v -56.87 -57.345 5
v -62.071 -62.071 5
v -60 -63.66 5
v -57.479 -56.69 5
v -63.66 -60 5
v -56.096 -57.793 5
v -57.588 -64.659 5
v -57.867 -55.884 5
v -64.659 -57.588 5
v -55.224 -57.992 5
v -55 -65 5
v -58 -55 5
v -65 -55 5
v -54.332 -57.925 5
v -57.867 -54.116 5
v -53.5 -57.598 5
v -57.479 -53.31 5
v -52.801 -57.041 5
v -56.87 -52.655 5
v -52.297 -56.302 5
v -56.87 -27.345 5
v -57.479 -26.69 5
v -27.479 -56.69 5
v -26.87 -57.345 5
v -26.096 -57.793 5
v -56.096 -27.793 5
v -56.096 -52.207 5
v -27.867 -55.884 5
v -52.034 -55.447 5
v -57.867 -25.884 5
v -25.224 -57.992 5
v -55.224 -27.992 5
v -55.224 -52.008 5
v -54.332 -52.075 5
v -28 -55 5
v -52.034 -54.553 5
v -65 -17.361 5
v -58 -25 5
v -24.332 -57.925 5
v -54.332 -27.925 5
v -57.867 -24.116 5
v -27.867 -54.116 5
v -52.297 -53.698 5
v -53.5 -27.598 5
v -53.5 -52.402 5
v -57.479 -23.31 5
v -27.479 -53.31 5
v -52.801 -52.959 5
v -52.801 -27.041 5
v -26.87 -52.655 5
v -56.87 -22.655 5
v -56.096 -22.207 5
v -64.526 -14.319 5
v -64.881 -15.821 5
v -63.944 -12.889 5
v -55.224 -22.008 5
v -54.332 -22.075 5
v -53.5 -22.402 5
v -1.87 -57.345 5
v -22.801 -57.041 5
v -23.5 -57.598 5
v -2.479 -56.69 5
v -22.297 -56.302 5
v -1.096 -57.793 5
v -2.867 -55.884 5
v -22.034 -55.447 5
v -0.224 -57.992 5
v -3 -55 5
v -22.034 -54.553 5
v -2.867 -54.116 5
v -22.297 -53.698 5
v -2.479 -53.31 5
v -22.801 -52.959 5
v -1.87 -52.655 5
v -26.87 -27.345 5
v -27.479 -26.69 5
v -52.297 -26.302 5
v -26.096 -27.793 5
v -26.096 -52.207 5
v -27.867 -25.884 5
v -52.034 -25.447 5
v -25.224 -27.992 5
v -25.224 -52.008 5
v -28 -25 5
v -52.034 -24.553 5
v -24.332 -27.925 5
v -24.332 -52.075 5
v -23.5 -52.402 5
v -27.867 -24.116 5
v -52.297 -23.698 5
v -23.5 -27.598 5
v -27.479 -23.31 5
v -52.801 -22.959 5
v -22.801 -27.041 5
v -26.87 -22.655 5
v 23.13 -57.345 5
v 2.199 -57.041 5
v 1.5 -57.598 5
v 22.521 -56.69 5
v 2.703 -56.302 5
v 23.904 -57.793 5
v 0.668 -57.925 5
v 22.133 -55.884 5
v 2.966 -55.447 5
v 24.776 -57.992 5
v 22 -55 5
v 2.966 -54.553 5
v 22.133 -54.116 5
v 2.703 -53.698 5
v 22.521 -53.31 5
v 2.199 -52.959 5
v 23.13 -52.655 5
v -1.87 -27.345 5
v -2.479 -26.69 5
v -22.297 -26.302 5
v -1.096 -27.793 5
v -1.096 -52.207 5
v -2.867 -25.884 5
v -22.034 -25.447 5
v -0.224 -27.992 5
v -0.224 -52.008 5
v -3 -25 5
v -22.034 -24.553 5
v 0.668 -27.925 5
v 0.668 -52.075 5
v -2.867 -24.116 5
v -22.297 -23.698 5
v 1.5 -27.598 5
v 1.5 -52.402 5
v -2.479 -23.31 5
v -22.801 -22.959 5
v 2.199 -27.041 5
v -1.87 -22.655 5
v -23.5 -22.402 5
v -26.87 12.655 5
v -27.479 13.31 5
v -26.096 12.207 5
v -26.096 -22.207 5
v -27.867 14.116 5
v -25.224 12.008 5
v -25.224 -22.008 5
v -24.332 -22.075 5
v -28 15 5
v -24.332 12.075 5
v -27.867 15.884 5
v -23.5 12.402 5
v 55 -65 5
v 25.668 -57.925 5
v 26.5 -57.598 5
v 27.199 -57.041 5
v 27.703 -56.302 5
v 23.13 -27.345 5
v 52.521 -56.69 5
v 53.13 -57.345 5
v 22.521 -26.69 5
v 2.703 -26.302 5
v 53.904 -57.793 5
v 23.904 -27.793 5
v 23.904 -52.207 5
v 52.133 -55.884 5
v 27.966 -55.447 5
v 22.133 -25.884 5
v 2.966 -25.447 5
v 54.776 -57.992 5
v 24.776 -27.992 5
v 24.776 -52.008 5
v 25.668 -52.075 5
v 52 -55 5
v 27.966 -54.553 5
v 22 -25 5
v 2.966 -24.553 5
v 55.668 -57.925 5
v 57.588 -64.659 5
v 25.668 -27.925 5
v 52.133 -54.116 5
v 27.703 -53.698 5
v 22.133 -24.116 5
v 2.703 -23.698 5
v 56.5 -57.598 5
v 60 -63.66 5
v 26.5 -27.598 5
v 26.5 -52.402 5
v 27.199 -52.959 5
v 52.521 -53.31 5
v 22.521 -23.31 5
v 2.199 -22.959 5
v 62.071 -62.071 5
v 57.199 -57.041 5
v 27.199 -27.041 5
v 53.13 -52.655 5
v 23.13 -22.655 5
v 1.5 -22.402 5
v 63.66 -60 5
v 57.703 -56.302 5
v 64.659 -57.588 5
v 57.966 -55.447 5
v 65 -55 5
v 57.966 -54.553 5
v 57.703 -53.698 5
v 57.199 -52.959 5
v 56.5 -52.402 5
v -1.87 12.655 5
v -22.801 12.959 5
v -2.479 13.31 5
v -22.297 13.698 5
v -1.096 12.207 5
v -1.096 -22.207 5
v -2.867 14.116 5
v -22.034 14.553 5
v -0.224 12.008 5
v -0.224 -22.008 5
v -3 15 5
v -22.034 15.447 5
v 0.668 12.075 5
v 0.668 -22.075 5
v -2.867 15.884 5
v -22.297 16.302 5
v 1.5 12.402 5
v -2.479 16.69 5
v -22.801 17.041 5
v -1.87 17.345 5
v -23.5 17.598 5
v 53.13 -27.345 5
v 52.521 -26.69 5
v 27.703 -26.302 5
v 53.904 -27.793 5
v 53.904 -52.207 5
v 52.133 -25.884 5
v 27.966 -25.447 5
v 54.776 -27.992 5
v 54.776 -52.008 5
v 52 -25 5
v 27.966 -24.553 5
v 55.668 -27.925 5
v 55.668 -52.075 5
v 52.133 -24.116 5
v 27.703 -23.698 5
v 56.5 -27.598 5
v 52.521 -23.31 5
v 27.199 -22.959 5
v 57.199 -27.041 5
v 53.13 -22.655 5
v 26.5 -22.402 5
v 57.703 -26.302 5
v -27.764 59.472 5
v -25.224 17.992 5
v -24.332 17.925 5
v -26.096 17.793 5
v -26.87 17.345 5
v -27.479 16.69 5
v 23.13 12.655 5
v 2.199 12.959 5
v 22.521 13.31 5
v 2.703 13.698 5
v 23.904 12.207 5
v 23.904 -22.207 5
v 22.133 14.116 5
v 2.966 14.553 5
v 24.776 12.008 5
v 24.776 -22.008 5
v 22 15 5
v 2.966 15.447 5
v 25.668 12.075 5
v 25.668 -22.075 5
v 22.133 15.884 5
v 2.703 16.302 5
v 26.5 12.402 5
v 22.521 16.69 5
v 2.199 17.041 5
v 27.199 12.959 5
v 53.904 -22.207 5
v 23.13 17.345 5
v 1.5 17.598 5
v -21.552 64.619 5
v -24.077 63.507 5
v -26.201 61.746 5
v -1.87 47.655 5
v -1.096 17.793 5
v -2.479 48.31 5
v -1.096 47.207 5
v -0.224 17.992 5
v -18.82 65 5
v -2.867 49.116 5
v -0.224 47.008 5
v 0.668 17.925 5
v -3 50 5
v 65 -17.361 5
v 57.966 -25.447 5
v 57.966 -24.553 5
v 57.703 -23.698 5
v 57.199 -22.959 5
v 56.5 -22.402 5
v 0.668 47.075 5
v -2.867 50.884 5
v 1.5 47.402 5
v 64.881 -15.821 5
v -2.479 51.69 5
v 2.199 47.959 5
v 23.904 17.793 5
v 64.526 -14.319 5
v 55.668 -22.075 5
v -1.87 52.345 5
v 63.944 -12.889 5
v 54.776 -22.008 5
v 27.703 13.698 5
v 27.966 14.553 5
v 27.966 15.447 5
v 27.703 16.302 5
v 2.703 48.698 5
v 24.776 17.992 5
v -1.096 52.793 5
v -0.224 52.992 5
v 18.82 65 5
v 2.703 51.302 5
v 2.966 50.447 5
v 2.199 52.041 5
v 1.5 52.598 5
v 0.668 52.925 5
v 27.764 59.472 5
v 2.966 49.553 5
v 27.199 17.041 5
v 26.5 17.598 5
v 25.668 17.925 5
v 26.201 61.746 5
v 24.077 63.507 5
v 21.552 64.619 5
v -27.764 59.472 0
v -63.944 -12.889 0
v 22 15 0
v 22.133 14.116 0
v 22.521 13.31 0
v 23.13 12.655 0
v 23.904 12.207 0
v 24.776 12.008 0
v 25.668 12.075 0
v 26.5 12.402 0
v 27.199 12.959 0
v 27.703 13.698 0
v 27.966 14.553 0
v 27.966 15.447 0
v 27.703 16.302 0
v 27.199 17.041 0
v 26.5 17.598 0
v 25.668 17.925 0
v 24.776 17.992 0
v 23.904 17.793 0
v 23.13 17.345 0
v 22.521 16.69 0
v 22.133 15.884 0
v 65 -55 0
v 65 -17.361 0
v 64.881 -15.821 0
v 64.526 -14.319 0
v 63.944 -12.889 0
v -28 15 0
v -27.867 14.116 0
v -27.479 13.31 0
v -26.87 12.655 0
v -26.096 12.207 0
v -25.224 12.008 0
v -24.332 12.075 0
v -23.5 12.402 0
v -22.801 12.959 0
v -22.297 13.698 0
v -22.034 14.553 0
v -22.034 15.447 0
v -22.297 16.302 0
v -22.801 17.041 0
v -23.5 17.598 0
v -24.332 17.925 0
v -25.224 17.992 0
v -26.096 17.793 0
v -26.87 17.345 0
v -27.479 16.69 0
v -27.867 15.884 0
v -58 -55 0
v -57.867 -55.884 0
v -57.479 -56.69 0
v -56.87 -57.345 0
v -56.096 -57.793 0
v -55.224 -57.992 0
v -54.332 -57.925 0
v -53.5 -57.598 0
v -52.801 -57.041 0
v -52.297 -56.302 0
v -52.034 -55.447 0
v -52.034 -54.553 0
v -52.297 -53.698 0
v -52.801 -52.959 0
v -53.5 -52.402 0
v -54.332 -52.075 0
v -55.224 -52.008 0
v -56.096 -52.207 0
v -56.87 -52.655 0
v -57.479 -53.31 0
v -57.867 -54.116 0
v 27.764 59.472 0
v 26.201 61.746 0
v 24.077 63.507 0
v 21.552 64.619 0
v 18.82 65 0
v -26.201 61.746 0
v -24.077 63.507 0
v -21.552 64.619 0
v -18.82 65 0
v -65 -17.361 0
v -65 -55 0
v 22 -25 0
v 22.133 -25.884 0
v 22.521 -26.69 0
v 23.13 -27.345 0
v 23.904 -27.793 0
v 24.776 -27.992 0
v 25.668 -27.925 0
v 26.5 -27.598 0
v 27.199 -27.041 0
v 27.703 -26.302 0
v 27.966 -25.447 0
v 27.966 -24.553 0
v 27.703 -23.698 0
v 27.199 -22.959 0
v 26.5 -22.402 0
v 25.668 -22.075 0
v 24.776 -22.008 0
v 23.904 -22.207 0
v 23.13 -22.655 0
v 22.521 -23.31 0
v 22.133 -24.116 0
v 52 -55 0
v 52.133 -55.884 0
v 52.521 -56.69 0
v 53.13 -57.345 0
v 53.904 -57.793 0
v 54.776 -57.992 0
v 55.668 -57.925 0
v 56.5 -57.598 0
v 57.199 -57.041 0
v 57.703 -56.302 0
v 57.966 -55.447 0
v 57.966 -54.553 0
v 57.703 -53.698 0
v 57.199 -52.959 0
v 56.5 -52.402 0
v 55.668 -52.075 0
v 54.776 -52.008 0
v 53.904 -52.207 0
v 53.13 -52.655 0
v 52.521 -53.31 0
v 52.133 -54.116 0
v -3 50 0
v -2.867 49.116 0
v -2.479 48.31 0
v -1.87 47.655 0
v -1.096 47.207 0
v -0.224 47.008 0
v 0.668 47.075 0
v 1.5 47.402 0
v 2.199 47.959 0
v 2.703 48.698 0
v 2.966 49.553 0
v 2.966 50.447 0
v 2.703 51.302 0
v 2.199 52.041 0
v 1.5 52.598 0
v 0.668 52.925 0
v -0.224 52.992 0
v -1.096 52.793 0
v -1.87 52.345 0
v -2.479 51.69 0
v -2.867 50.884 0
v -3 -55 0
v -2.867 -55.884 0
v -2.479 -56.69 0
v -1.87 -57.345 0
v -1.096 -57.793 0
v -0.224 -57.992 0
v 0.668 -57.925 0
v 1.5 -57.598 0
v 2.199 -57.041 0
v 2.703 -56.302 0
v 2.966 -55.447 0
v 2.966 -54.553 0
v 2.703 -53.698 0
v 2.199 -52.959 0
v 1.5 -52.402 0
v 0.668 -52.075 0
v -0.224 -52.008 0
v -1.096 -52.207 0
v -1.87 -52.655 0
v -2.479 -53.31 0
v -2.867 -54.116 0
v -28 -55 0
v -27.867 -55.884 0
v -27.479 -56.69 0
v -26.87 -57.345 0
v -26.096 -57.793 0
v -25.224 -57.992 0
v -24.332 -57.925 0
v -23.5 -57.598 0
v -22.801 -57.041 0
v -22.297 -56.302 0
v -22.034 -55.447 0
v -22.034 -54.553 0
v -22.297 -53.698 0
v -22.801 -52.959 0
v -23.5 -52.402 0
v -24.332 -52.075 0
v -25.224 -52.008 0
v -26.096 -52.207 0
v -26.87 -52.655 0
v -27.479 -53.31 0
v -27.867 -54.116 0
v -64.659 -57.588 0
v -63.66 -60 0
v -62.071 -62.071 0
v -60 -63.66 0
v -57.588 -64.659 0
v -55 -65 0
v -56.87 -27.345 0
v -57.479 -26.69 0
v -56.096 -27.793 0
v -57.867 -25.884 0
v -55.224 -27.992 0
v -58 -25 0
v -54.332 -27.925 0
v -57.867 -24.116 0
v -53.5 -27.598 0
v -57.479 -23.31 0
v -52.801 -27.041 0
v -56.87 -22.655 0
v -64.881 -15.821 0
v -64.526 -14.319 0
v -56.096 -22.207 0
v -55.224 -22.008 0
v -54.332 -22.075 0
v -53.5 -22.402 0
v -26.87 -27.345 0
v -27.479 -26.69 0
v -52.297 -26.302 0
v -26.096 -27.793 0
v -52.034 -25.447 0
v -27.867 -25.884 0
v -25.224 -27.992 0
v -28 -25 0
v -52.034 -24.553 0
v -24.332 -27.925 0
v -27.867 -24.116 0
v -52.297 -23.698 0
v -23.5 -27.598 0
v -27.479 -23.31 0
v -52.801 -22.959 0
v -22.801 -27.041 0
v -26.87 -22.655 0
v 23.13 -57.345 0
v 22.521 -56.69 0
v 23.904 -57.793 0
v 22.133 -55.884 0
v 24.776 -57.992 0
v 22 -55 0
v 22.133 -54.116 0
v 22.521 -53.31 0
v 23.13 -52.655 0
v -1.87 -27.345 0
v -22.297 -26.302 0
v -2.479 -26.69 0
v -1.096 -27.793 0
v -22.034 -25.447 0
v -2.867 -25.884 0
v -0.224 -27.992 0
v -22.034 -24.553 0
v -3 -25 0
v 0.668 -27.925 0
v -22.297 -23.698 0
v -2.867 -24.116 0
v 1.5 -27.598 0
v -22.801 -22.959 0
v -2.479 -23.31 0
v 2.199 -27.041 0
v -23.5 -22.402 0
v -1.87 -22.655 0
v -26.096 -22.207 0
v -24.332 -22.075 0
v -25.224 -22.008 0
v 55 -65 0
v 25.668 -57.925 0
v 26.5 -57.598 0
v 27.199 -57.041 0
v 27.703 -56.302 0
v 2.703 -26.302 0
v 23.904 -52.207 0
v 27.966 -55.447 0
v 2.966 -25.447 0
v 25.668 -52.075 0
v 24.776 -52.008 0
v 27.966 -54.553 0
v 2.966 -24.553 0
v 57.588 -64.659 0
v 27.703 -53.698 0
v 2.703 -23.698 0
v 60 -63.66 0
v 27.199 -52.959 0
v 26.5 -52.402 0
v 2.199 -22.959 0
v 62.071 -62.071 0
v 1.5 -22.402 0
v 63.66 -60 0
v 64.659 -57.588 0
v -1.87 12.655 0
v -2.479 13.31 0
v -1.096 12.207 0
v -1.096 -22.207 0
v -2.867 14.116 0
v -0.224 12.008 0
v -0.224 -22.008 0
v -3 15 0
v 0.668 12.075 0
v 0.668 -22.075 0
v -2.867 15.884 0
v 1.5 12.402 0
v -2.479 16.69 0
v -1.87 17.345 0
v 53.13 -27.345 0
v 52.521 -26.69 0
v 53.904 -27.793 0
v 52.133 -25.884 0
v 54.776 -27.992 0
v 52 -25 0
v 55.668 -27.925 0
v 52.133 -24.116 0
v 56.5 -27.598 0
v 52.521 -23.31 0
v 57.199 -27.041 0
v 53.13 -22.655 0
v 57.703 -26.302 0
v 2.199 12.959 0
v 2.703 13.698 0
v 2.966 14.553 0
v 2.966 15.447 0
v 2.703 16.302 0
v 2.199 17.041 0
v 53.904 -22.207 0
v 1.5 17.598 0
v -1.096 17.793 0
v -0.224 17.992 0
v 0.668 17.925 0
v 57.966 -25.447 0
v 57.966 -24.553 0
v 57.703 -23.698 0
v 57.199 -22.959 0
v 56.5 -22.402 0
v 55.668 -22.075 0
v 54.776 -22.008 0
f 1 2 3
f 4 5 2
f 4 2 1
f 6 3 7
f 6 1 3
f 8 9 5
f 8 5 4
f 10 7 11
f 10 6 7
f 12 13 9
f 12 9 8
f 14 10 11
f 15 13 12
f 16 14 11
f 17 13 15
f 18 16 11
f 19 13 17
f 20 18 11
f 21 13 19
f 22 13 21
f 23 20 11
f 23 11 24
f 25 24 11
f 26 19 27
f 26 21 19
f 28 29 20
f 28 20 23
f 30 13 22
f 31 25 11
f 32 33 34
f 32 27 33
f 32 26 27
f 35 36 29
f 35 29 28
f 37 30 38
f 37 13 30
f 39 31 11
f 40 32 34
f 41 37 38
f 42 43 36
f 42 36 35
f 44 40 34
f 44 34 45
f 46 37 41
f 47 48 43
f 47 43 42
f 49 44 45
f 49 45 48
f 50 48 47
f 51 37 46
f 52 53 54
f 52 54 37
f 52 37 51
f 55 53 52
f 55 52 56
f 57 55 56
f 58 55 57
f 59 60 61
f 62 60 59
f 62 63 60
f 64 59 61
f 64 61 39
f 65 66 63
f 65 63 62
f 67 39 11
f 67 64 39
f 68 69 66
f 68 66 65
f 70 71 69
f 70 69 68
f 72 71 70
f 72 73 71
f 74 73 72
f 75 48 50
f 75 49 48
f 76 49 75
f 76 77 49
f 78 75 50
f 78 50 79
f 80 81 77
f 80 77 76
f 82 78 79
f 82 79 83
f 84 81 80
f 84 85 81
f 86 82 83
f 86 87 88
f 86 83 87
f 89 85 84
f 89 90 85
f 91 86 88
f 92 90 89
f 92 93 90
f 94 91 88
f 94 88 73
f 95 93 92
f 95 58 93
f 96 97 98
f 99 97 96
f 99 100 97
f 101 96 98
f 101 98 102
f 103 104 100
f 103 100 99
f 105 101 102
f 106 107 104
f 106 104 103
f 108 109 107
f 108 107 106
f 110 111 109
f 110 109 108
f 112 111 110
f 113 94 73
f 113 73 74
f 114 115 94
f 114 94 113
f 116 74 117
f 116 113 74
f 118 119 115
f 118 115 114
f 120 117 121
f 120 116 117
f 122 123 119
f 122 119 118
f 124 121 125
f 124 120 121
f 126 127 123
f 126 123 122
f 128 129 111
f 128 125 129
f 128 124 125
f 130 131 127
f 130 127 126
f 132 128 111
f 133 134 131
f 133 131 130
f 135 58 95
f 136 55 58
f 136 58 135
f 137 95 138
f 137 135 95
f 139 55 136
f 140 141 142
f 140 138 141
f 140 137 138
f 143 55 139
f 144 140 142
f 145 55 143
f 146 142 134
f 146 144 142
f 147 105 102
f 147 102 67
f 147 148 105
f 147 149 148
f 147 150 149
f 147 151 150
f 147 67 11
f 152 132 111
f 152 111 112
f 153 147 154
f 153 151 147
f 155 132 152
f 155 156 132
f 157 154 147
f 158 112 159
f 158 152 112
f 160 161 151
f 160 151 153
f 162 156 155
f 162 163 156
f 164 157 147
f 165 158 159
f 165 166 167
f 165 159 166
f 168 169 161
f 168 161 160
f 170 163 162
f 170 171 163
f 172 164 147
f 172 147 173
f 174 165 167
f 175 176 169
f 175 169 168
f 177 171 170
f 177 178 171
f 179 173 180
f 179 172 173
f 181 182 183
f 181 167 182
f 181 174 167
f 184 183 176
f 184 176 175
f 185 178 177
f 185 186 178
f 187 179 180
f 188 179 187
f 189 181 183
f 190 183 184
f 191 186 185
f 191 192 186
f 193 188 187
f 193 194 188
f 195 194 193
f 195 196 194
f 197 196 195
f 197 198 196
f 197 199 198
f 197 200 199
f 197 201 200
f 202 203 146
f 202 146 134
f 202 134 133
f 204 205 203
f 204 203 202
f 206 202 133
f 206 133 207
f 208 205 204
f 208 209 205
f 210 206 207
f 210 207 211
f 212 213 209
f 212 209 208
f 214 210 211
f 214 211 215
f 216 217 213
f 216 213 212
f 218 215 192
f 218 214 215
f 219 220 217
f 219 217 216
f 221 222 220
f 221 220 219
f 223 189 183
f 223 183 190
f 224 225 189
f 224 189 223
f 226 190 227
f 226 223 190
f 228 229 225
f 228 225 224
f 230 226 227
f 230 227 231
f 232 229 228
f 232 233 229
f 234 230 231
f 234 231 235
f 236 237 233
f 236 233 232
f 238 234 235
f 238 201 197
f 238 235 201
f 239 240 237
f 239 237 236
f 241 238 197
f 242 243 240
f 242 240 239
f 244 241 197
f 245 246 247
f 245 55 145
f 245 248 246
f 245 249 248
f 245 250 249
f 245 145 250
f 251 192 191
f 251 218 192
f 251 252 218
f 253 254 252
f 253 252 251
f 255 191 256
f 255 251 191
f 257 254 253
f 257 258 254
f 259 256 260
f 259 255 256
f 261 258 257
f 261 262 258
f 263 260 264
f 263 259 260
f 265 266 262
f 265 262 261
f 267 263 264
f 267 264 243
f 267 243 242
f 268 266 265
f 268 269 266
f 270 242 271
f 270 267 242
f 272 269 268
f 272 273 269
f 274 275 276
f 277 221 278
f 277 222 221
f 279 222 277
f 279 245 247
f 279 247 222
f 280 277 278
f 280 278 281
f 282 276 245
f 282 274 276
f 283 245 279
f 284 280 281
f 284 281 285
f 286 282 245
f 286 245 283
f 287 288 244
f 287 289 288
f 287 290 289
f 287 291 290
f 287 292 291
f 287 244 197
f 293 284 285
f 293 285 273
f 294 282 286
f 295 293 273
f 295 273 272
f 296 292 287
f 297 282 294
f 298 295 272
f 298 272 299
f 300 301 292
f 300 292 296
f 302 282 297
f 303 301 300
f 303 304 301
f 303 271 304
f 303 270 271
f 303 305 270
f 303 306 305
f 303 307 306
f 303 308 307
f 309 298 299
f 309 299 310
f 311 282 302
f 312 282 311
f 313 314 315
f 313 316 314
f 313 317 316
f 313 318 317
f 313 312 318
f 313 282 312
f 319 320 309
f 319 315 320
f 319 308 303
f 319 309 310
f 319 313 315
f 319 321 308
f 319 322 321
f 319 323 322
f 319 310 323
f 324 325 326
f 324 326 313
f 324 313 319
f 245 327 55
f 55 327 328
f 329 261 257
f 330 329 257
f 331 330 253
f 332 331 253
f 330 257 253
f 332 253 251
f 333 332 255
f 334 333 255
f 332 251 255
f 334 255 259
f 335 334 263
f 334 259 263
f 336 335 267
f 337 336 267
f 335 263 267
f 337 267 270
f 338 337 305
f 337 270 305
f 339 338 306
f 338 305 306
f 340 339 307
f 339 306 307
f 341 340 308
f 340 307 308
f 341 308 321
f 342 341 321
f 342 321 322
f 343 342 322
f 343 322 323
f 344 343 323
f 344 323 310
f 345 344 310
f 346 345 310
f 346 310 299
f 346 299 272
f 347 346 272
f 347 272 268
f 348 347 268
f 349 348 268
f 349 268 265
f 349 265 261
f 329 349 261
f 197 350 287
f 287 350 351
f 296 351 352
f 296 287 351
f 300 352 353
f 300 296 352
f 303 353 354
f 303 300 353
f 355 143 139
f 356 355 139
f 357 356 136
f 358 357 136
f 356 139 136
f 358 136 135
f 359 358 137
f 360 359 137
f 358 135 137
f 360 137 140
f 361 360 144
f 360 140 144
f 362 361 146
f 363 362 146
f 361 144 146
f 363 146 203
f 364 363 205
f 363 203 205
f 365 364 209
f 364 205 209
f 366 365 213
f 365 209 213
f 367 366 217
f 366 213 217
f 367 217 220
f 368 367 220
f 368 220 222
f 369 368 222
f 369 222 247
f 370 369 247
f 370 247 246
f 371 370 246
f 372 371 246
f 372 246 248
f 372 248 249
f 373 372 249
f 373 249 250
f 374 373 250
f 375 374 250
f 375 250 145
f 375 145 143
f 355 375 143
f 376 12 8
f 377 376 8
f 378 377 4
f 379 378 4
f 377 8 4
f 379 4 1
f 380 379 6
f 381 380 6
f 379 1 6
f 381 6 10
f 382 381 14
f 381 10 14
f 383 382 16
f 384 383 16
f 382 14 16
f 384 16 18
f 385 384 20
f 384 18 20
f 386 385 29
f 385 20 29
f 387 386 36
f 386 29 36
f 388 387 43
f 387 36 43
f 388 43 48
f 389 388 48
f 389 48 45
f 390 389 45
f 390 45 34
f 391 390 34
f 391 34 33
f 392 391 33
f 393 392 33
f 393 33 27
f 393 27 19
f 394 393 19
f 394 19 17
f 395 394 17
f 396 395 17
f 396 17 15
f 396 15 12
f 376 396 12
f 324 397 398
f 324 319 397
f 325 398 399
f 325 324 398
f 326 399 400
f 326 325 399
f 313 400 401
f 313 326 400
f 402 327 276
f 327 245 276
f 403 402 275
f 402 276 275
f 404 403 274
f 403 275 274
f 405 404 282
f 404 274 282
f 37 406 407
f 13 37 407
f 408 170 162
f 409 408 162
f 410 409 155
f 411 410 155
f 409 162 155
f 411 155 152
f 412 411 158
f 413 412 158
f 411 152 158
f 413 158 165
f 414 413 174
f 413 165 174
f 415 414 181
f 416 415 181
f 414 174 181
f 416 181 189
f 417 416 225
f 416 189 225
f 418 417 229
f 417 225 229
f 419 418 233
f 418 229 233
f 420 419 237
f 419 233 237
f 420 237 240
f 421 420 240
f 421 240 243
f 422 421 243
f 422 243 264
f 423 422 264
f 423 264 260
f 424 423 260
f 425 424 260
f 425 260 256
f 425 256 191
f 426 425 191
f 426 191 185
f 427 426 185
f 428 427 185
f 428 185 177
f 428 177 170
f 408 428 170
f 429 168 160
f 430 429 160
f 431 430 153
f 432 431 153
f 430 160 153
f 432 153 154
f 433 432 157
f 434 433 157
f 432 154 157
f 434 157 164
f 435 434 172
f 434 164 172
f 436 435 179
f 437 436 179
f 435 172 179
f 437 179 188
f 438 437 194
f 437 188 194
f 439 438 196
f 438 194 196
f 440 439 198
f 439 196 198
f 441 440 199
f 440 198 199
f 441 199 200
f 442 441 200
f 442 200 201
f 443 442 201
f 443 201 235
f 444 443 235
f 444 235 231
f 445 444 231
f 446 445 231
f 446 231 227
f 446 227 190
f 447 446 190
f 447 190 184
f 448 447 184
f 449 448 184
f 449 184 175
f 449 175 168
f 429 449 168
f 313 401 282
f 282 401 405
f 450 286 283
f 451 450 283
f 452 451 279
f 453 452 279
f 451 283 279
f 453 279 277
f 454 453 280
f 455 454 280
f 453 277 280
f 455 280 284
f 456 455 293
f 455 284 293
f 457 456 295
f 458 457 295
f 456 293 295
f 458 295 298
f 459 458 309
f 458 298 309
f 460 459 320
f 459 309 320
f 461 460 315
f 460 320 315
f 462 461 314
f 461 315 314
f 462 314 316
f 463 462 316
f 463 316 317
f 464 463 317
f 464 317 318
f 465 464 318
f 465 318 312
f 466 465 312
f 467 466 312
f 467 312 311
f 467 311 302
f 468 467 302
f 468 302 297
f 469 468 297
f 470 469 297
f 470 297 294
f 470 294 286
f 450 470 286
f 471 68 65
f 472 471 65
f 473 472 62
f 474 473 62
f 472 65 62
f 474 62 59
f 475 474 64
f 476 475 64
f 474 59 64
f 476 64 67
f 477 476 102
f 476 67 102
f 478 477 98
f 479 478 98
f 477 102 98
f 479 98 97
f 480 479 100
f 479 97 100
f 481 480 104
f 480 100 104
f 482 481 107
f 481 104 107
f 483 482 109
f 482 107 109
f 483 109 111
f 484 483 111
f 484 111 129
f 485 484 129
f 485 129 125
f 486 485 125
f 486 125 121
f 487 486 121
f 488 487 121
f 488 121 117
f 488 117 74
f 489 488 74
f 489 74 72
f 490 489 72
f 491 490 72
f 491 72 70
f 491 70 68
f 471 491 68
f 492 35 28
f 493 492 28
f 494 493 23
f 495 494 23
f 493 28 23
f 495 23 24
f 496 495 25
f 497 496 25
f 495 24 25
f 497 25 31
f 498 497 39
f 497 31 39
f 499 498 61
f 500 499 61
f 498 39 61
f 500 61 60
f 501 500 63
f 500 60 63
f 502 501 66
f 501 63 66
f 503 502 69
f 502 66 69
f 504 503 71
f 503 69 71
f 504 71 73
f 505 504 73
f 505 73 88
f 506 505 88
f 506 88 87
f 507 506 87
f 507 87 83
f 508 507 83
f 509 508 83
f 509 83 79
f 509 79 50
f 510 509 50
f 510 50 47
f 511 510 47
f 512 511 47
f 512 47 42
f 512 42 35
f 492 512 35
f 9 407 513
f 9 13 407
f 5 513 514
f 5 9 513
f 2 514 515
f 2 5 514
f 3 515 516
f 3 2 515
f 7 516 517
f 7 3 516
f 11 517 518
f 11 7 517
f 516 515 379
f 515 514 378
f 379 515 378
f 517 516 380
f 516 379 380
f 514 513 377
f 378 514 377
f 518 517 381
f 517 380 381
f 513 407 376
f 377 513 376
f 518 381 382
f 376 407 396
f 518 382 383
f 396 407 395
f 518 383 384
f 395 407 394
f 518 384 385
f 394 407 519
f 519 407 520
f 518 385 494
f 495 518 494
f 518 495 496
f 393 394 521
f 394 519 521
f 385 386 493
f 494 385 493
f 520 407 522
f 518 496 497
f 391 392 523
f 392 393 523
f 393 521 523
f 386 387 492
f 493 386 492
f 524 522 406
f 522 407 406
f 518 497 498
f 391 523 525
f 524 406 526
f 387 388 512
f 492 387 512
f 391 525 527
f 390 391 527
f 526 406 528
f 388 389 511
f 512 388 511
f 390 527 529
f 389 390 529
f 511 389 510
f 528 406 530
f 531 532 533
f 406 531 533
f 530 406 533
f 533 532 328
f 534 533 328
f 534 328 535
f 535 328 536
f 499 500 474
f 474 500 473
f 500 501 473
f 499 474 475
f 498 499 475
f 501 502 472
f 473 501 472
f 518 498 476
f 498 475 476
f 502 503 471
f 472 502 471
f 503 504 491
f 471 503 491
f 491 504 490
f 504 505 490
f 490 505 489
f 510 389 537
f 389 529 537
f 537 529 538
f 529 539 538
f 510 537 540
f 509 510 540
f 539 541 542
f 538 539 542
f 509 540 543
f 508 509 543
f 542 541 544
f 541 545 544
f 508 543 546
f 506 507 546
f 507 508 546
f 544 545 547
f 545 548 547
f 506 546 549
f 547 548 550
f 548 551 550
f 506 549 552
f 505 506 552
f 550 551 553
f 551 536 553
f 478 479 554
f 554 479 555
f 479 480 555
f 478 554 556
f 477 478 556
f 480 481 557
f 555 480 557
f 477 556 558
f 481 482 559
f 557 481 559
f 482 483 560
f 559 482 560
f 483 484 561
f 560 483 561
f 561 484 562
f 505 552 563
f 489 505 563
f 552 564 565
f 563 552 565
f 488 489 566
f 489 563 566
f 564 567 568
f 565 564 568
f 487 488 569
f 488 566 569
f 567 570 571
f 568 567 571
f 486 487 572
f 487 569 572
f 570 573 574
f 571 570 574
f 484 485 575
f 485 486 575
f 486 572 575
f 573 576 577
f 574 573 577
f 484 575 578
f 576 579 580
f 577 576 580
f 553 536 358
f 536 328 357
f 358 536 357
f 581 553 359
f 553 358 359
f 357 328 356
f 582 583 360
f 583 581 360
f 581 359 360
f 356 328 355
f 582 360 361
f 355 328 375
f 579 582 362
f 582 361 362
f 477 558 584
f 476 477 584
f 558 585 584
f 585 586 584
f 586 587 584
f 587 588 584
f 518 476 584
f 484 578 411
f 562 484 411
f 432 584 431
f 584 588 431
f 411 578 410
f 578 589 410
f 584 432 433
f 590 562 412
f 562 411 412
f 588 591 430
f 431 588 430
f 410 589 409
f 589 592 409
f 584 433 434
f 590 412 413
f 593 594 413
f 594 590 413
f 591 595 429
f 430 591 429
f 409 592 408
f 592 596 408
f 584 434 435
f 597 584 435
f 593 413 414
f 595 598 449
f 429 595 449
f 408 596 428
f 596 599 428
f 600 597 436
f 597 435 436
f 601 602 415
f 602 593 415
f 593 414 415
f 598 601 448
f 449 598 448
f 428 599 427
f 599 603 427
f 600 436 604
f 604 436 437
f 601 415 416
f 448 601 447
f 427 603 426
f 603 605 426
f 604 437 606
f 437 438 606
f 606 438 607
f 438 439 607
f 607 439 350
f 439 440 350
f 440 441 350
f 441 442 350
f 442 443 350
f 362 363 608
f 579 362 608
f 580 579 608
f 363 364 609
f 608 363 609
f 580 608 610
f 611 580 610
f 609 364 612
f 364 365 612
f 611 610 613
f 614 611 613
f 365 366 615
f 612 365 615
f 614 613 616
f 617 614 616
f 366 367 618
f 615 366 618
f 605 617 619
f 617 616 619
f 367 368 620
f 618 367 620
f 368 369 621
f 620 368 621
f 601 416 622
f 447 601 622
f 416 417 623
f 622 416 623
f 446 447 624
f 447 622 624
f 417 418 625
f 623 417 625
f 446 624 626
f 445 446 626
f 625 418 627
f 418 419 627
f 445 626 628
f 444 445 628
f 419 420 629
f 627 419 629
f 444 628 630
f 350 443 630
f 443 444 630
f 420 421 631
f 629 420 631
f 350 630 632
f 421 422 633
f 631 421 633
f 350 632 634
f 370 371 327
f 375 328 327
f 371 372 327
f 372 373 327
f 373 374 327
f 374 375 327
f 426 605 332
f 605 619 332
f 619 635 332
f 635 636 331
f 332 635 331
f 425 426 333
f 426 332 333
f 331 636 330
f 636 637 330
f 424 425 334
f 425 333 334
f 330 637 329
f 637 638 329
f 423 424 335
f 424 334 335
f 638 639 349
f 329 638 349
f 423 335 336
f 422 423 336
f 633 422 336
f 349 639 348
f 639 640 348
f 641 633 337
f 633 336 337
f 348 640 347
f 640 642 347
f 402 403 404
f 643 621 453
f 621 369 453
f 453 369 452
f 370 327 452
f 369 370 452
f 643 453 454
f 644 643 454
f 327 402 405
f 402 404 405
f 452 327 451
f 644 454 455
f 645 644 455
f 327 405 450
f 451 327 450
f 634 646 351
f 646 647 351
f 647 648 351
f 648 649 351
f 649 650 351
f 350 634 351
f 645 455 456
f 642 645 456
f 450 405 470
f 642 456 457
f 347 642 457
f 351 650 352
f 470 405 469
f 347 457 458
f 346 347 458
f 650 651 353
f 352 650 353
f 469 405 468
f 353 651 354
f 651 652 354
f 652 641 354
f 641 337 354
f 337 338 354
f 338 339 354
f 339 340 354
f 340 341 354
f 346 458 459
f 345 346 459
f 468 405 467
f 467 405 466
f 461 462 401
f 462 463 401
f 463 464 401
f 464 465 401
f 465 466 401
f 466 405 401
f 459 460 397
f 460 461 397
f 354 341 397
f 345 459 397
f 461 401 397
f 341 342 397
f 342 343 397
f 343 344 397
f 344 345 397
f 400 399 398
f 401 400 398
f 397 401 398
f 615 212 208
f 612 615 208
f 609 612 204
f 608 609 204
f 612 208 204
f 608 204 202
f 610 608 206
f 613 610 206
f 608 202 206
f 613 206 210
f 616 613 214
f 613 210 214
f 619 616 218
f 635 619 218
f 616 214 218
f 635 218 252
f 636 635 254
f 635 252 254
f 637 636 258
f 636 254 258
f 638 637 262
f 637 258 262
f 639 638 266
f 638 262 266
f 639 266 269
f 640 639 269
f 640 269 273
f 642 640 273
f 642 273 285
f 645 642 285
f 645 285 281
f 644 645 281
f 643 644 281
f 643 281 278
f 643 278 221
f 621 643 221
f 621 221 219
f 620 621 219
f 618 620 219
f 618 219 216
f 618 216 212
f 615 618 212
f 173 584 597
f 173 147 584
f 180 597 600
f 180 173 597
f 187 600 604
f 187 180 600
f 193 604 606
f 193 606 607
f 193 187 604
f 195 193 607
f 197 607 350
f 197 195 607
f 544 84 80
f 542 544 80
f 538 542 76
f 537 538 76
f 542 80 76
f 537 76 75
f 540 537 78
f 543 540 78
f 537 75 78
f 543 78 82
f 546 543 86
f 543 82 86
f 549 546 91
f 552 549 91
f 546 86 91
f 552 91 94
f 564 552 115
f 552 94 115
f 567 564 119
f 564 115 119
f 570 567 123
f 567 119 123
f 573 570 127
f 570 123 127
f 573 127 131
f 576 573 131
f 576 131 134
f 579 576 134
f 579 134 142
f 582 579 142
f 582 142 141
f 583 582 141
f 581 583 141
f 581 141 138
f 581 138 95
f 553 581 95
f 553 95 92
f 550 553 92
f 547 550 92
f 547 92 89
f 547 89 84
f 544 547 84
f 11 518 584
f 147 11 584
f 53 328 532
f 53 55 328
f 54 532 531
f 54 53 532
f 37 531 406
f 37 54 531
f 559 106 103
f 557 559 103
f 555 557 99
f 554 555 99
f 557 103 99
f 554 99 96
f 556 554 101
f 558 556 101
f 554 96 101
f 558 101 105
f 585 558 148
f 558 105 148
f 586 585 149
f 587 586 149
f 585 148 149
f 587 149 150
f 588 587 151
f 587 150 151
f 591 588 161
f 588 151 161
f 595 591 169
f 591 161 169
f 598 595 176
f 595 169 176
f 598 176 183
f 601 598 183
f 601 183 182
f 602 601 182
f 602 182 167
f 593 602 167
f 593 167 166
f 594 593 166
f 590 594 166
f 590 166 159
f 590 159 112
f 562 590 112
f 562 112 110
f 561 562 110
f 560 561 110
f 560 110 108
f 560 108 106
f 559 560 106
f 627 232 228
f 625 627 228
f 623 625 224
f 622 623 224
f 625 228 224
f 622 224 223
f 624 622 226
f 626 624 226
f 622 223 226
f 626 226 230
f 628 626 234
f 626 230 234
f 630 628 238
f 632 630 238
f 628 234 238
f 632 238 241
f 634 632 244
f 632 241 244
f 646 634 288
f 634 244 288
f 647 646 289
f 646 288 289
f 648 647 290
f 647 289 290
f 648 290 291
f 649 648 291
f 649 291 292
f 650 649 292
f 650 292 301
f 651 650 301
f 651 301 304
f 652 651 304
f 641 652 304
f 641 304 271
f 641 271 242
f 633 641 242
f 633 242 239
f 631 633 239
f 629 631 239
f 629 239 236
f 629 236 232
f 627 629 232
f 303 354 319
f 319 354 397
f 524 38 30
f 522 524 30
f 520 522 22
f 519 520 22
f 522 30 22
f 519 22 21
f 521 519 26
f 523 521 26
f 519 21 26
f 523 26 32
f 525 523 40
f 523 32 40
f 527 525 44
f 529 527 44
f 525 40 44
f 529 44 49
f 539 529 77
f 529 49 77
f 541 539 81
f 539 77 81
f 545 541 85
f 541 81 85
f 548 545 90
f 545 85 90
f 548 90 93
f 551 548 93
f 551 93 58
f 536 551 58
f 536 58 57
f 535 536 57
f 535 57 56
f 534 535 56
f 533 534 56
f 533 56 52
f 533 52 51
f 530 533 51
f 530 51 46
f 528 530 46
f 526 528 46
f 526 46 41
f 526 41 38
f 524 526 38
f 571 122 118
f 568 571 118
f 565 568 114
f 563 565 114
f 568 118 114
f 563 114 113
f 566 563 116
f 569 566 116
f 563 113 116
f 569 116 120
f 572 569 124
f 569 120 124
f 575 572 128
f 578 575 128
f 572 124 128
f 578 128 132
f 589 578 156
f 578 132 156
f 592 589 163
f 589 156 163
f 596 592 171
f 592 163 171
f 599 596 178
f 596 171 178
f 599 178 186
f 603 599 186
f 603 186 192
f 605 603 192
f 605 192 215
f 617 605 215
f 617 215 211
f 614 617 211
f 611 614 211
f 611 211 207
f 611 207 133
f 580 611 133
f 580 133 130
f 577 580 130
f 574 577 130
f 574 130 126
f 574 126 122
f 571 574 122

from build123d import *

# Parameters (mm, degrees)
F2_DEPTH = 5
F3_R     = 10
F4_D     = 6


with BuildPart() as f2:
    # F1 (on Top) → F2 (new body)
    with BuildSketch(Plane.XY):
        Polygon((-25.0000044703, 65), (-65, -15), (-65, -65), (65, -65), (65, -15), (25, 65), align=None)
    extrude(amount=F2_DEPTH)

    # F3
    f3_edges = [f2.edges().sort_by_distance(p)[0] for p in [
        (-65, -65, 2.5),
        (-65, -15, 2.5),
        (-25.000004, 65, 2.5),
        (25, 65, 2.5),
        (65, -15, 2.5),
        (65, -65, 2.5),
    ]]
    fillet(f3_edges, radius=F3_R)

    # F4 (through all)
    with Locations(Plane(origin=(0, 0, 0), x_dir=(1, 0, 0), z_dir=(0, 0, -1))):
        with Locations((-55.0000044703, 25), (-25.0000044703, 25), (-55.0000044703, 55), (-25.0000044703, 55), (25, 55), (25, 25), (55, 25), (55, 55), (0, -50), (0, 55), (0, 25), (25, -15), (-2.2352e-06, -15), (-25.0000044703, -15)):
            Hole(F4_D / 2)


solid = f2.part
